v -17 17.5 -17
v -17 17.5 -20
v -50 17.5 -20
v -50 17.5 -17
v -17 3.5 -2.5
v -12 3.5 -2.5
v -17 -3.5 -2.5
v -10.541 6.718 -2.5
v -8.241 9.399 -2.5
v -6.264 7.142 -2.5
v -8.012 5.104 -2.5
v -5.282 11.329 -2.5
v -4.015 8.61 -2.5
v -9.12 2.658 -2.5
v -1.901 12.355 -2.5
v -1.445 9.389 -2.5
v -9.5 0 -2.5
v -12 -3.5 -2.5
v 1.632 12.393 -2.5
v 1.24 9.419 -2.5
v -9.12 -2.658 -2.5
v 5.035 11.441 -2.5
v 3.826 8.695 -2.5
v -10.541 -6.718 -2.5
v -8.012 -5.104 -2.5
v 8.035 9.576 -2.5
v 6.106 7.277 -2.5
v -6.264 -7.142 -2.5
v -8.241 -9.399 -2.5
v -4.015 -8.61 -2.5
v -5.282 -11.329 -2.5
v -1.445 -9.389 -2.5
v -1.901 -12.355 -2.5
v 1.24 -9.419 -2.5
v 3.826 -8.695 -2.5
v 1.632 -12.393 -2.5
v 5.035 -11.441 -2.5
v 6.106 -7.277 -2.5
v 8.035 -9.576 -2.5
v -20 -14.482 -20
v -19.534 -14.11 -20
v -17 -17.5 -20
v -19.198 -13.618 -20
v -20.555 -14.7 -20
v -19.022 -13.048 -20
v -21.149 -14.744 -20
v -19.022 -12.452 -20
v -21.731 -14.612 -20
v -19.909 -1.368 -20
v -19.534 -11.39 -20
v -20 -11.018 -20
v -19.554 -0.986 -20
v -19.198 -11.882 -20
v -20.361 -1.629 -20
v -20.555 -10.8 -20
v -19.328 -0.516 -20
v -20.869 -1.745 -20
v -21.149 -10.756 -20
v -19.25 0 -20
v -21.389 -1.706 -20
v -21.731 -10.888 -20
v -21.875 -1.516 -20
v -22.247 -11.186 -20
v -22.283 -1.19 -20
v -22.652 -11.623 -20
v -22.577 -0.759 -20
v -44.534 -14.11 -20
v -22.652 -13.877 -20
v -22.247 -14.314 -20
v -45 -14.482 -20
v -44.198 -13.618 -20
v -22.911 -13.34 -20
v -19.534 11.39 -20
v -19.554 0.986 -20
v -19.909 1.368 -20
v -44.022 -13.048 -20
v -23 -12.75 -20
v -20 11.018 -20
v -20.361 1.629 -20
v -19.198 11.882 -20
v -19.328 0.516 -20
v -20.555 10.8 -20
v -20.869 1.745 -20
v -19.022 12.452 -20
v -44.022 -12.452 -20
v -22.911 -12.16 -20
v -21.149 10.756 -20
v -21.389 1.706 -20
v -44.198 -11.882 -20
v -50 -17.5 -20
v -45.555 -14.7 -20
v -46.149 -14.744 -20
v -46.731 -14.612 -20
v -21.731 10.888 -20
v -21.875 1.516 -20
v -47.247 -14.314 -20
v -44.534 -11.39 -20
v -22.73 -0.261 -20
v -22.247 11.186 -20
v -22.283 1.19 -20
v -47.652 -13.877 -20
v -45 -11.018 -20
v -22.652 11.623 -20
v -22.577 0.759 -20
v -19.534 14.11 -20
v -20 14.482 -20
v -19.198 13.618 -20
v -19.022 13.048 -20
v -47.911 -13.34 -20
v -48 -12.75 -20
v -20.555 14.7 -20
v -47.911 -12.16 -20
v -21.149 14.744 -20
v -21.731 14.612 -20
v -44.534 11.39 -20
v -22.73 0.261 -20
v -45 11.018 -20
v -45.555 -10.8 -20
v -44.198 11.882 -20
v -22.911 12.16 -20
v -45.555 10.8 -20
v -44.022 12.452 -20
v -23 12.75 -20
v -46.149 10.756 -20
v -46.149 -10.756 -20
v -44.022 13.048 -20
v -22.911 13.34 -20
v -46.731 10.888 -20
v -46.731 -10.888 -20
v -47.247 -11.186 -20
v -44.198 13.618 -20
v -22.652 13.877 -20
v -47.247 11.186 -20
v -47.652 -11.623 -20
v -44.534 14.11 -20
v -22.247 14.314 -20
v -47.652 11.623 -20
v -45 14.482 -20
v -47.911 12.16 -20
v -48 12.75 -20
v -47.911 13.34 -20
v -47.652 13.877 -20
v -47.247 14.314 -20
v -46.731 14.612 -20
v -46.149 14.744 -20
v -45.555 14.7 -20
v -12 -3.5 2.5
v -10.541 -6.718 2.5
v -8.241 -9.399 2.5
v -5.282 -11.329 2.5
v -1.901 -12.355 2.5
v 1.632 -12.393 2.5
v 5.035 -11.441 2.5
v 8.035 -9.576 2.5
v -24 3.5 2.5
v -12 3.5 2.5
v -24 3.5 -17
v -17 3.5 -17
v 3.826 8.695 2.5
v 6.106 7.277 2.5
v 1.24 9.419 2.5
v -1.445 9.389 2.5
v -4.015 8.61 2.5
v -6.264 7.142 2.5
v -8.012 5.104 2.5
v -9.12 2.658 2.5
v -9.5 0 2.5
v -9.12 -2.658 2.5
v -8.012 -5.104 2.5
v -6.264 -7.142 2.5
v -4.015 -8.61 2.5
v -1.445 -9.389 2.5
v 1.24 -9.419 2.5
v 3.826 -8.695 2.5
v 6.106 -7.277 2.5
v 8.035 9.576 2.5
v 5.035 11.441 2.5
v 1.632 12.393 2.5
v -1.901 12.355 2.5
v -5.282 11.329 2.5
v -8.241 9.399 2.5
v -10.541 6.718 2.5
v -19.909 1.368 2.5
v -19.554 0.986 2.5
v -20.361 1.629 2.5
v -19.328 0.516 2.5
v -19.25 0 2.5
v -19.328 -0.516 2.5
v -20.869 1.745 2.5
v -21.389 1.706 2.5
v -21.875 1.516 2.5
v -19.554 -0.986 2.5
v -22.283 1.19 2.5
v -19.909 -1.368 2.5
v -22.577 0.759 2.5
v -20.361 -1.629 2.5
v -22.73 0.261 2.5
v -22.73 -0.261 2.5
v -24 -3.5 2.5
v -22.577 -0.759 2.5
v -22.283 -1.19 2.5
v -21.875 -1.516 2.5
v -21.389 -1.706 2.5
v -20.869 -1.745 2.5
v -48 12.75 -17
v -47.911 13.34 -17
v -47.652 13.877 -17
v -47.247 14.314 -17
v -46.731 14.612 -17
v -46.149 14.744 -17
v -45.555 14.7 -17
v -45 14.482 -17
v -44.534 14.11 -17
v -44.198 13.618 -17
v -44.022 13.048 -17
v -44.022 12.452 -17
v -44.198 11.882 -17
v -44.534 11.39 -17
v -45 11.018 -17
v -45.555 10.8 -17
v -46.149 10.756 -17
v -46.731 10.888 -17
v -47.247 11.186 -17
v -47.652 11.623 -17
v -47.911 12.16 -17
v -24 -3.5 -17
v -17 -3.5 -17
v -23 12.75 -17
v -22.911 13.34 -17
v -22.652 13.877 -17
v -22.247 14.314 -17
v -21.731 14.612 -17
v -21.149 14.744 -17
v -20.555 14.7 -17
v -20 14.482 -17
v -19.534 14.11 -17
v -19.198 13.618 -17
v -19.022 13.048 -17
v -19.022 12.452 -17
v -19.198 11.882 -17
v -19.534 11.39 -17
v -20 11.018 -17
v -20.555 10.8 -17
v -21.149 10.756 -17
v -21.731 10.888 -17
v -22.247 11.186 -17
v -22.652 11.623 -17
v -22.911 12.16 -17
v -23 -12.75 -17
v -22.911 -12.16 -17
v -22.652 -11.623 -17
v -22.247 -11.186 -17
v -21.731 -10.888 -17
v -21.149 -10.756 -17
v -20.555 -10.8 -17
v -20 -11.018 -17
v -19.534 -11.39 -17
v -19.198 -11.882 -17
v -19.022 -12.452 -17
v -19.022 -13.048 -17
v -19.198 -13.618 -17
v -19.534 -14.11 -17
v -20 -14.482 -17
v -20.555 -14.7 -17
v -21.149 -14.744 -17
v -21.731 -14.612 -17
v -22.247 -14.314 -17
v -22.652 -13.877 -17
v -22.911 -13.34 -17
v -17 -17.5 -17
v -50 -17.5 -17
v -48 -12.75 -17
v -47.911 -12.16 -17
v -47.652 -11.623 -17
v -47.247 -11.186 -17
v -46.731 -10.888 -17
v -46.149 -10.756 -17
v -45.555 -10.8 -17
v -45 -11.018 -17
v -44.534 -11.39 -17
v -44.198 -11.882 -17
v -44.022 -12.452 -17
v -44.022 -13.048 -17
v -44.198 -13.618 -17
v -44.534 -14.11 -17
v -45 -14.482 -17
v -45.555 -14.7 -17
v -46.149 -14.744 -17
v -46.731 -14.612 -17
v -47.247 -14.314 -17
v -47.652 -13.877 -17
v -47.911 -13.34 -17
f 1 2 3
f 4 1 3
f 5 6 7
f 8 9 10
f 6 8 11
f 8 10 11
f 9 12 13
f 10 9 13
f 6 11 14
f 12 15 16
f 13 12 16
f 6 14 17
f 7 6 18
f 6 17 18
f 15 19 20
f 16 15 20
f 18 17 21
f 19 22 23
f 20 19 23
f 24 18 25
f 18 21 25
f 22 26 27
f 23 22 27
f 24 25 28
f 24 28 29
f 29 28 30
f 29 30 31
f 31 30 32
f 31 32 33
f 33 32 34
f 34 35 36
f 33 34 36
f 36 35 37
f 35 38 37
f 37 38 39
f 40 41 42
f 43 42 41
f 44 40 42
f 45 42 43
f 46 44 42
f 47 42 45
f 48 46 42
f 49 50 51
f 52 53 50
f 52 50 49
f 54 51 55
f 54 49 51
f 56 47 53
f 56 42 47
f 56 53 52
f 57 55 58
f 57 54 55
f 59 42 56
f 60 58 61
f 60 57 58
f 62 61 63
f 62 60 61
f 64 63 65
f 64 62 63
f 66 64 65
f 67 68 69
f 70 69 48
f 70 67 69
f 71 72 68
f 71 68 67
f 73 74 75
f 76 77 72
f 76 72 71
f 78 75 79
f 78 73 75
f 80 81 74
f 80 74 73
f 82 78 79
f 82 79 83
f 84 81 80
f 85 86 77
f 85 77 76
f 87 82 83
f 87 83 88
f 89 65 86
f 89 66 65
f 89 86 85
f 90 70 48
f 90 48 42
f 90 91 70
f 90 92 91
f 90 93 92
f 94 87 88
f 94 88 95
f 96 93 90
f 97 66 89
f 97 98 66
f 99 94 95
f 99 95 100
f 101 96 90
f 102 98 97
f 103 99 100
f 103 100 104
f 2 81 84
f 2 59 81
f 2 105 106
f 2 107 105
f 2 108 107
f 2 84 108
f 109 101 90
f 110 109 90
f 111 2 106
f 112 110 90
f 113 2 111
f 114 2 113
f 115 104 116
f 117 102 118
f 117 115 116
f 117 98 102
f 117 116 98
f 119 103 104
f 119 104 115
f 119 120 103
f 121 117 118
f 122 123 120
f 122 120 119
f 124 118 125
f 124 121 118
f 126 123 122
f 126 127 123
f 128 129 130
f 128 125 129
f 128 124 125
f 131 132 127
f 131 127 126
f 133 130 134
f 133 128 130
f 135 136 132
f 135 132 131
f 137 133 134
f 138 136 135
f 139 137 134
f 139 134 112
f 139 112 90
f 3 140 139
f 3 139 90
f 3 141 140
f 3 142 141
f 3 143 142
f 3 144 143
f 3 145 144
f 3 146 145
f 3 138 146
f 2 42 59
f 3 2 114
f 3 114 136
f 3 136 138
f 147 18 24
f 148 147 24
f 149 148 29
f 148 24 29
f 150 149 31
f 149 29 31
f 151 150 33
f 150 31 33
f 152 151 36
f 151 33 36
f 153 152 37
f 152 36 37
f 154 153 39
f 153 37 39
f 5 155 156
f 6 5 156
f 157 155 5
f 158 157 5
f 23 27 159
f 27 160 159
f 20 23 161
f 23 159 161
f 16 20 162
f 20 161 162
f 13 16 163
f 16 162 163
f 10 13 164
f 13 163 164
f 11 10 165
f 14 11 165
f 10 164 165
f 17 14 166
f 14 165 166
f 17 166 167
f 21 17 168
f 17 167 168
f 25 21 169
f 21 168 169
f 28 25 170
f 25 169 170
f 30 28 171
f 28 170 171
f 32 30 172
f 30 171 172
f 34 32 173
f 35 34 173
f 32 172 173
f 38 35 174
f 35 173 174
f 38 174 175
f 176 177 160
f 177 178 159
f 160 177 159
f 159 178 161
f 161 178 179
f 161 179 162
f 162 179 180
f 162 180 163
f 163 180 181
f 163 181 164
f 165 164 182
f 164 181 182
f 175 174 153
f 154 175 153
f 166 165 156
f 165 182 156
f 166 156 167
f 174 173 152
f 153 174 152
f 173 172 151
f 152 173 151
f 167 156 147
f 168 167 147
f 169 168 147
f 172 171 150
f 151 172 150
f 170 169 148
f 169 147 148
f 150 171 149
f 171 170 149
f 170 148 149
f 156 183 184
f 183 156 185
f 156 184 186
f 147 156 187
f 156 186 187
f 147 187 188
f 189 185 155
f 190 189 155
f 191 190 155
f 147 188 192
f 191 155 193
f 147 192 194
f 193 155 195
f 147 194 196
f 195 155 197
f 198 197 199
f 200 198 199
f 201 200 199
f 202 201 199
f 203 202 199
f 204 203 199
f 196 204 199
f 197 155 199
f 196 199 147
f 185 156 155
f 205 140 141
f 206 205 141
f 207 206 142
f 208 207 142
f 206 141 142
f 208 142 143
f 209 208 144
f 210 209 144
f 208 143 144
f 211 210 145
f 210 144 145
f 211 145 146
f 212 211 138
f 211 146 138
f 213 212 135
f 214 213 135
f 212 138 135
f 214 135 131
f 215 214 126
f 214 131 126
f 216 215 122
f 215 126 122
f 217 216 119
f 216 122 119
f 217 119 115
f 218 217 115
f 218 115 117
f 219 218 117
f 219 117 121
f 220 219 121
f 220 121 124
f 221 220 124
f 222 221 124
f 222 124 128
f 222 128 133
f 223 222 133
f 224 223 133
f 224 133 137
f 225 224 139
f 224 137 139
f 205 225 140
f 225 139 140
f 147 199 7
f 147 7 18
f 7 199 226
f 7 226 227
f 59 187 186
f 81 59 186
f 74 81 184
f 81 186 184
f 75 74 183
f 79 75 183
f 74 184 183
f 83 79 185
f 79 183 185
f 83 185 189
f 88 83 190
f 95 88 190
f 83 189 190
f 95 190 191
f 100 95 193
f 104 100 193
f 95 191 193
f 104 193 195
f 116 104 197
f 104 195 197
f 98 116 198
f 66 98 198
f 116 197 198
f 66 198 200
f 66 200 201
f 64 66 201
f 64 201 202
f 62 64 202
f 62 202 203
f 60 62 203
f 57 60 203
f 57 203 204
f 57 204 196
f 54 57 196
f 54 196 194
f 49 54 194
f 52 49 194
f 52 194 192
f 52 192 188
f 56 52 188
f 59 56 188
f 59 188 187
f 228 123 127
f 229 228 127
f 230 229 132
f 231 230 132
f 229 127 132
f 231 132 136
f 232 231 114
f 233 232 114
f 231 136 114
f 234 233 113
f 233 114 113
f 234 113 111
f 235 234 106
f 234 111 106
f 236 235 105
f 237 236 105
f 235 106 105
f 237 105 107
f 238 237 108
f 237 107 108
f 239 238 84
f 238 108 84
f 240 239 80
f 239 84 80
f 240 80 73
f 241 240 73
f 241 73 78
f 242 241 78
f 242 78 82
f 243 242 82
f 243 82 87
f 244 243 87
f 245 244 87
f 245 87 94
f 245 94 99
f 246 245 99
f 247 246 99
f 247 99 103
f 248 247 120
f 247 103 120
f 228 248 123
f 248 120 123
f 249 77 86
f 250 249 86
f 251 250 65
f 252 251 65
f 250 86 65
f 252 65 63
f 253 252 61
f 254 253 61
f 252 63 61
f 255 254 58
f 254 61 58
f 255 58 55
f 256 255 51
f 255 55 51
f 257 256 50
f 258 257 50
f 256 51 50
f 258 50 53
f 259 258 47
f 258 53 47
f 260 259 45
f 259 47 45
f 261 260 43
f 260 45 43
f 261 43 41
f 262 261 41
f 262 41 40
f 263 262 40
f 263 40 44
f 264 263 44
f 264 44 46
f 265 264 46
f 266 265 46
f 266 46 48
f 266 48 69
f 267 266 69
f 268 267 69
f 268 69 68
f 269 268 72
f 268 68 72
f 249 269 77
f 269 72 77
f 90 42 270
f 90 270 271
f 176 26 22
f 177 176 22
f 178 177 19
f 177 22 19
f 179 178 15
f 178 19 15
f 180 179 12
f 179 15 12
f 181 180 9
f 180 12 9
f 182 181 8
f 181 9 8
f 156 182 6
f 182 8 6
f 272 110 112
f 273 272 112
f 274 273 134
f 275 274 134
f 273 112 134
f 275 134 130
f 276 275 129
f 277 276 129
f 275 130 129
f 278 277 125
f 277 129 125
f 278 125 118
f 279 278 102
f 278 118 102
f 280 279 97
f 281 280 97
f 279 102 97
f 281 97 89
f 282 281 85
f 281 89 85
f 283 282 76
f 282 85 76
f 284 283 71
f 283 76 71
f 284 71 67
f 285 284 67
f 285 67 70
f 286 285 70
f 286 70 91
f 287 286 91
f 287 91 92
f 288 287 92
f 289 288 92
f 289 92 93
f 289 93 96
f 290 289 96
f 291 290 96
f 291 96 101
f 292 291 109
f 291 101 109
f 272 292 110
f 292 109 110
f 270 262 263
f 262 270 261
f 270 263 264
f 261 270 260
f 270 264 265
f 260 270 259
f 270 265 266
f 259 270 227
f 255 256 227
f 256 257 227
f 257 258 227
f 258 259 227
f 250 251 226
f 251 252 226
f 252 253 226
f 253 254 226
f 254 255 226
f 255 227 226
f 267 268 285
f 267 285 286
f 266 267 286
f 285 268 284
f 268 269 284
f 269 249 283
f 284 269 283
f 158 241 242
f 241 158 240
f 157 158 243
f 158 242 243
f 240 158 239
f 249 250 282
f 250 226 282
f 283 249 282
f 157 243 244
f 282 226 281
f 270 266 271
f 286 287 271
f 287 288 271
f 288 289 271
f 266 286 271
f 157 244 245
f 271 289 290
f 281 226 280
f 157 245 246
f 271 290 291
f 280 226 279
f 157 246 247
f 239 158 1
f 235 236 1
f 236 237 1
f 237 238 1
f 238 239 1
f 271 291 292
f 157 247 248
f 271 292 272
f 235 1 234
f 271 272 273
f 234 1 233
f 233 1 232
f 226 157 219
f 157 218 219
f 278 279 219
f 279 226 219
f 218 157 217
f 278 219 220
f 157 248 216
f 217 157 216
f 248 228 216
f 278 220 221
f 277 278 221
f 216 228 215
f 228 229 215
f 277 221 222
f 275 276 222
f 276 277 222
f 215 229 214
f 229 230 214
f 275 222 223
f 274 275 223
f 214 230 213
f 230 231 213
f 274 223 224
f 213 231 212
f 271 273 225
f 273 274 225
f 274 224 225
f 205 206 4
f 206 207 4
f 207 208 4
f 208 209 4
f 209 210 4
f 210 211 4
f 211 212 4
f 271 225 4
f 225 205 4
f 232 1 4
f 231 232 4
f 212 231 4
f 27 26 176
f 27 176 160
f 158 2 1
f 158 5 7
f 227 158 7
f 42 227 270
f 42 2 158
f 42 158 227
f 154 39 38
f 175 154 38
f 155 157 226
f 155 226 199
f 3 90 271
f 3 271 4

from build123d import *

# Parameters (mm, degrees)
RESSALTO_EXTRUS_O1_DEPTH = 3.5
ESBO_O15_W               = 33
ESBO_O15_H               = 14
ESBO_O15_R               = 2
ESBO_O15_H_2             = 7
RESSALTO_EXTRUS_O2_DEPTH = 3
ESBO_O16_R               = 1.75
CORTE_EXTRUS_O1_DEPTH    = 58.554322166


with BuildPart() as part:
    # Esboço14 → Ressalto-extrusão1 (new, symmetric)
    with BuildSketch(Plane(origin=(0, 0, 0), x_dir=(1, 0, 0), z_dir=(0, 1, 0))):
        Polygon((-12, 2.5), (-17, 2.5), (-17, 20), (-50, 20), (-50, 17), (-24, 17), (-24, -2.5), (-12, -2.5), align=None)
    extrude(amount=RESSALTO_EXTRUS_O1_DEPTH, both=True)

    # Esboço15 → Ressalto-extrusão2 (add)
    with BuildSketch(Plane(origin=(0, 0, -20), x_dir=(-1, 0, 0), z_dir=(0, 0, -1))):
        with Locations((33.5, -10.5)):
            Rectangle(ESBO_O15_W, ESBO_O15_H)
        with Locations((21, -12.75)):
            Circle(ESBO_O15_R, mode=Mode.SUBTRACT)
        with Locations((46, -12.75)):
            Circle(ESBO_O15_R, mode=Mode.SUBTRACT)
        with Locations((33.5, 10.5)):
            Rectangle(ESBO_O15_W, ESBO_O15_H)
        with Locations((21, 12.75)):
            Circle(ESBO_O15_R, mode=Mode.SUBTRACT)
        with Locations((46, 12.75)):
            Circle(ESBO_O15_R, mode=Mode.SUBTRACT)
        with Locations((33.5, 0)):
            Rectangle(ESBO_O15_W, ESBO_O15_H_2)
    extrude(amount=-RESSALTO_EXTRUS_O2_DEPTH)

    # Esboço16 → Corte-extrusão1 (cut, through all)
    with BuildSketch(Plane.XY.offset(2.5)):
        with Locations((-21, 0)):
            Circle(ESBO_O16_R)
    extrude(amount=-CORTE_EXTRUS_O1_DEPTH, mode=Mode.SUBTRACT)

    # Varredura1: sweep along a path in Esboço1
    with BuildLine(Plane.XY) as varredura1_path:
        ThreePointArc((7.070663707, 8.426488874), (-11, 0), (7.070663707, -8.426488874))
    # 3DSketch2 → Varredura1 (sweep)
    with BuildSketch(Plane(origin=(8.034845121, -9.575555539, 2.5), x_dir=(-0.33071149682512846, 0.39412661445355873, -0.8574929257125443), z_dir=(0.7660444431189768, 0.6427876096865409, 3.624573608241852e-15))):
        Polygon((0, 0), (1.543487266, 2.572478777), (5.830951895, 0), (4.287464629, -2.572478777), align=None)
    sweep(path=varredura1_path.line)


solid = part.part
